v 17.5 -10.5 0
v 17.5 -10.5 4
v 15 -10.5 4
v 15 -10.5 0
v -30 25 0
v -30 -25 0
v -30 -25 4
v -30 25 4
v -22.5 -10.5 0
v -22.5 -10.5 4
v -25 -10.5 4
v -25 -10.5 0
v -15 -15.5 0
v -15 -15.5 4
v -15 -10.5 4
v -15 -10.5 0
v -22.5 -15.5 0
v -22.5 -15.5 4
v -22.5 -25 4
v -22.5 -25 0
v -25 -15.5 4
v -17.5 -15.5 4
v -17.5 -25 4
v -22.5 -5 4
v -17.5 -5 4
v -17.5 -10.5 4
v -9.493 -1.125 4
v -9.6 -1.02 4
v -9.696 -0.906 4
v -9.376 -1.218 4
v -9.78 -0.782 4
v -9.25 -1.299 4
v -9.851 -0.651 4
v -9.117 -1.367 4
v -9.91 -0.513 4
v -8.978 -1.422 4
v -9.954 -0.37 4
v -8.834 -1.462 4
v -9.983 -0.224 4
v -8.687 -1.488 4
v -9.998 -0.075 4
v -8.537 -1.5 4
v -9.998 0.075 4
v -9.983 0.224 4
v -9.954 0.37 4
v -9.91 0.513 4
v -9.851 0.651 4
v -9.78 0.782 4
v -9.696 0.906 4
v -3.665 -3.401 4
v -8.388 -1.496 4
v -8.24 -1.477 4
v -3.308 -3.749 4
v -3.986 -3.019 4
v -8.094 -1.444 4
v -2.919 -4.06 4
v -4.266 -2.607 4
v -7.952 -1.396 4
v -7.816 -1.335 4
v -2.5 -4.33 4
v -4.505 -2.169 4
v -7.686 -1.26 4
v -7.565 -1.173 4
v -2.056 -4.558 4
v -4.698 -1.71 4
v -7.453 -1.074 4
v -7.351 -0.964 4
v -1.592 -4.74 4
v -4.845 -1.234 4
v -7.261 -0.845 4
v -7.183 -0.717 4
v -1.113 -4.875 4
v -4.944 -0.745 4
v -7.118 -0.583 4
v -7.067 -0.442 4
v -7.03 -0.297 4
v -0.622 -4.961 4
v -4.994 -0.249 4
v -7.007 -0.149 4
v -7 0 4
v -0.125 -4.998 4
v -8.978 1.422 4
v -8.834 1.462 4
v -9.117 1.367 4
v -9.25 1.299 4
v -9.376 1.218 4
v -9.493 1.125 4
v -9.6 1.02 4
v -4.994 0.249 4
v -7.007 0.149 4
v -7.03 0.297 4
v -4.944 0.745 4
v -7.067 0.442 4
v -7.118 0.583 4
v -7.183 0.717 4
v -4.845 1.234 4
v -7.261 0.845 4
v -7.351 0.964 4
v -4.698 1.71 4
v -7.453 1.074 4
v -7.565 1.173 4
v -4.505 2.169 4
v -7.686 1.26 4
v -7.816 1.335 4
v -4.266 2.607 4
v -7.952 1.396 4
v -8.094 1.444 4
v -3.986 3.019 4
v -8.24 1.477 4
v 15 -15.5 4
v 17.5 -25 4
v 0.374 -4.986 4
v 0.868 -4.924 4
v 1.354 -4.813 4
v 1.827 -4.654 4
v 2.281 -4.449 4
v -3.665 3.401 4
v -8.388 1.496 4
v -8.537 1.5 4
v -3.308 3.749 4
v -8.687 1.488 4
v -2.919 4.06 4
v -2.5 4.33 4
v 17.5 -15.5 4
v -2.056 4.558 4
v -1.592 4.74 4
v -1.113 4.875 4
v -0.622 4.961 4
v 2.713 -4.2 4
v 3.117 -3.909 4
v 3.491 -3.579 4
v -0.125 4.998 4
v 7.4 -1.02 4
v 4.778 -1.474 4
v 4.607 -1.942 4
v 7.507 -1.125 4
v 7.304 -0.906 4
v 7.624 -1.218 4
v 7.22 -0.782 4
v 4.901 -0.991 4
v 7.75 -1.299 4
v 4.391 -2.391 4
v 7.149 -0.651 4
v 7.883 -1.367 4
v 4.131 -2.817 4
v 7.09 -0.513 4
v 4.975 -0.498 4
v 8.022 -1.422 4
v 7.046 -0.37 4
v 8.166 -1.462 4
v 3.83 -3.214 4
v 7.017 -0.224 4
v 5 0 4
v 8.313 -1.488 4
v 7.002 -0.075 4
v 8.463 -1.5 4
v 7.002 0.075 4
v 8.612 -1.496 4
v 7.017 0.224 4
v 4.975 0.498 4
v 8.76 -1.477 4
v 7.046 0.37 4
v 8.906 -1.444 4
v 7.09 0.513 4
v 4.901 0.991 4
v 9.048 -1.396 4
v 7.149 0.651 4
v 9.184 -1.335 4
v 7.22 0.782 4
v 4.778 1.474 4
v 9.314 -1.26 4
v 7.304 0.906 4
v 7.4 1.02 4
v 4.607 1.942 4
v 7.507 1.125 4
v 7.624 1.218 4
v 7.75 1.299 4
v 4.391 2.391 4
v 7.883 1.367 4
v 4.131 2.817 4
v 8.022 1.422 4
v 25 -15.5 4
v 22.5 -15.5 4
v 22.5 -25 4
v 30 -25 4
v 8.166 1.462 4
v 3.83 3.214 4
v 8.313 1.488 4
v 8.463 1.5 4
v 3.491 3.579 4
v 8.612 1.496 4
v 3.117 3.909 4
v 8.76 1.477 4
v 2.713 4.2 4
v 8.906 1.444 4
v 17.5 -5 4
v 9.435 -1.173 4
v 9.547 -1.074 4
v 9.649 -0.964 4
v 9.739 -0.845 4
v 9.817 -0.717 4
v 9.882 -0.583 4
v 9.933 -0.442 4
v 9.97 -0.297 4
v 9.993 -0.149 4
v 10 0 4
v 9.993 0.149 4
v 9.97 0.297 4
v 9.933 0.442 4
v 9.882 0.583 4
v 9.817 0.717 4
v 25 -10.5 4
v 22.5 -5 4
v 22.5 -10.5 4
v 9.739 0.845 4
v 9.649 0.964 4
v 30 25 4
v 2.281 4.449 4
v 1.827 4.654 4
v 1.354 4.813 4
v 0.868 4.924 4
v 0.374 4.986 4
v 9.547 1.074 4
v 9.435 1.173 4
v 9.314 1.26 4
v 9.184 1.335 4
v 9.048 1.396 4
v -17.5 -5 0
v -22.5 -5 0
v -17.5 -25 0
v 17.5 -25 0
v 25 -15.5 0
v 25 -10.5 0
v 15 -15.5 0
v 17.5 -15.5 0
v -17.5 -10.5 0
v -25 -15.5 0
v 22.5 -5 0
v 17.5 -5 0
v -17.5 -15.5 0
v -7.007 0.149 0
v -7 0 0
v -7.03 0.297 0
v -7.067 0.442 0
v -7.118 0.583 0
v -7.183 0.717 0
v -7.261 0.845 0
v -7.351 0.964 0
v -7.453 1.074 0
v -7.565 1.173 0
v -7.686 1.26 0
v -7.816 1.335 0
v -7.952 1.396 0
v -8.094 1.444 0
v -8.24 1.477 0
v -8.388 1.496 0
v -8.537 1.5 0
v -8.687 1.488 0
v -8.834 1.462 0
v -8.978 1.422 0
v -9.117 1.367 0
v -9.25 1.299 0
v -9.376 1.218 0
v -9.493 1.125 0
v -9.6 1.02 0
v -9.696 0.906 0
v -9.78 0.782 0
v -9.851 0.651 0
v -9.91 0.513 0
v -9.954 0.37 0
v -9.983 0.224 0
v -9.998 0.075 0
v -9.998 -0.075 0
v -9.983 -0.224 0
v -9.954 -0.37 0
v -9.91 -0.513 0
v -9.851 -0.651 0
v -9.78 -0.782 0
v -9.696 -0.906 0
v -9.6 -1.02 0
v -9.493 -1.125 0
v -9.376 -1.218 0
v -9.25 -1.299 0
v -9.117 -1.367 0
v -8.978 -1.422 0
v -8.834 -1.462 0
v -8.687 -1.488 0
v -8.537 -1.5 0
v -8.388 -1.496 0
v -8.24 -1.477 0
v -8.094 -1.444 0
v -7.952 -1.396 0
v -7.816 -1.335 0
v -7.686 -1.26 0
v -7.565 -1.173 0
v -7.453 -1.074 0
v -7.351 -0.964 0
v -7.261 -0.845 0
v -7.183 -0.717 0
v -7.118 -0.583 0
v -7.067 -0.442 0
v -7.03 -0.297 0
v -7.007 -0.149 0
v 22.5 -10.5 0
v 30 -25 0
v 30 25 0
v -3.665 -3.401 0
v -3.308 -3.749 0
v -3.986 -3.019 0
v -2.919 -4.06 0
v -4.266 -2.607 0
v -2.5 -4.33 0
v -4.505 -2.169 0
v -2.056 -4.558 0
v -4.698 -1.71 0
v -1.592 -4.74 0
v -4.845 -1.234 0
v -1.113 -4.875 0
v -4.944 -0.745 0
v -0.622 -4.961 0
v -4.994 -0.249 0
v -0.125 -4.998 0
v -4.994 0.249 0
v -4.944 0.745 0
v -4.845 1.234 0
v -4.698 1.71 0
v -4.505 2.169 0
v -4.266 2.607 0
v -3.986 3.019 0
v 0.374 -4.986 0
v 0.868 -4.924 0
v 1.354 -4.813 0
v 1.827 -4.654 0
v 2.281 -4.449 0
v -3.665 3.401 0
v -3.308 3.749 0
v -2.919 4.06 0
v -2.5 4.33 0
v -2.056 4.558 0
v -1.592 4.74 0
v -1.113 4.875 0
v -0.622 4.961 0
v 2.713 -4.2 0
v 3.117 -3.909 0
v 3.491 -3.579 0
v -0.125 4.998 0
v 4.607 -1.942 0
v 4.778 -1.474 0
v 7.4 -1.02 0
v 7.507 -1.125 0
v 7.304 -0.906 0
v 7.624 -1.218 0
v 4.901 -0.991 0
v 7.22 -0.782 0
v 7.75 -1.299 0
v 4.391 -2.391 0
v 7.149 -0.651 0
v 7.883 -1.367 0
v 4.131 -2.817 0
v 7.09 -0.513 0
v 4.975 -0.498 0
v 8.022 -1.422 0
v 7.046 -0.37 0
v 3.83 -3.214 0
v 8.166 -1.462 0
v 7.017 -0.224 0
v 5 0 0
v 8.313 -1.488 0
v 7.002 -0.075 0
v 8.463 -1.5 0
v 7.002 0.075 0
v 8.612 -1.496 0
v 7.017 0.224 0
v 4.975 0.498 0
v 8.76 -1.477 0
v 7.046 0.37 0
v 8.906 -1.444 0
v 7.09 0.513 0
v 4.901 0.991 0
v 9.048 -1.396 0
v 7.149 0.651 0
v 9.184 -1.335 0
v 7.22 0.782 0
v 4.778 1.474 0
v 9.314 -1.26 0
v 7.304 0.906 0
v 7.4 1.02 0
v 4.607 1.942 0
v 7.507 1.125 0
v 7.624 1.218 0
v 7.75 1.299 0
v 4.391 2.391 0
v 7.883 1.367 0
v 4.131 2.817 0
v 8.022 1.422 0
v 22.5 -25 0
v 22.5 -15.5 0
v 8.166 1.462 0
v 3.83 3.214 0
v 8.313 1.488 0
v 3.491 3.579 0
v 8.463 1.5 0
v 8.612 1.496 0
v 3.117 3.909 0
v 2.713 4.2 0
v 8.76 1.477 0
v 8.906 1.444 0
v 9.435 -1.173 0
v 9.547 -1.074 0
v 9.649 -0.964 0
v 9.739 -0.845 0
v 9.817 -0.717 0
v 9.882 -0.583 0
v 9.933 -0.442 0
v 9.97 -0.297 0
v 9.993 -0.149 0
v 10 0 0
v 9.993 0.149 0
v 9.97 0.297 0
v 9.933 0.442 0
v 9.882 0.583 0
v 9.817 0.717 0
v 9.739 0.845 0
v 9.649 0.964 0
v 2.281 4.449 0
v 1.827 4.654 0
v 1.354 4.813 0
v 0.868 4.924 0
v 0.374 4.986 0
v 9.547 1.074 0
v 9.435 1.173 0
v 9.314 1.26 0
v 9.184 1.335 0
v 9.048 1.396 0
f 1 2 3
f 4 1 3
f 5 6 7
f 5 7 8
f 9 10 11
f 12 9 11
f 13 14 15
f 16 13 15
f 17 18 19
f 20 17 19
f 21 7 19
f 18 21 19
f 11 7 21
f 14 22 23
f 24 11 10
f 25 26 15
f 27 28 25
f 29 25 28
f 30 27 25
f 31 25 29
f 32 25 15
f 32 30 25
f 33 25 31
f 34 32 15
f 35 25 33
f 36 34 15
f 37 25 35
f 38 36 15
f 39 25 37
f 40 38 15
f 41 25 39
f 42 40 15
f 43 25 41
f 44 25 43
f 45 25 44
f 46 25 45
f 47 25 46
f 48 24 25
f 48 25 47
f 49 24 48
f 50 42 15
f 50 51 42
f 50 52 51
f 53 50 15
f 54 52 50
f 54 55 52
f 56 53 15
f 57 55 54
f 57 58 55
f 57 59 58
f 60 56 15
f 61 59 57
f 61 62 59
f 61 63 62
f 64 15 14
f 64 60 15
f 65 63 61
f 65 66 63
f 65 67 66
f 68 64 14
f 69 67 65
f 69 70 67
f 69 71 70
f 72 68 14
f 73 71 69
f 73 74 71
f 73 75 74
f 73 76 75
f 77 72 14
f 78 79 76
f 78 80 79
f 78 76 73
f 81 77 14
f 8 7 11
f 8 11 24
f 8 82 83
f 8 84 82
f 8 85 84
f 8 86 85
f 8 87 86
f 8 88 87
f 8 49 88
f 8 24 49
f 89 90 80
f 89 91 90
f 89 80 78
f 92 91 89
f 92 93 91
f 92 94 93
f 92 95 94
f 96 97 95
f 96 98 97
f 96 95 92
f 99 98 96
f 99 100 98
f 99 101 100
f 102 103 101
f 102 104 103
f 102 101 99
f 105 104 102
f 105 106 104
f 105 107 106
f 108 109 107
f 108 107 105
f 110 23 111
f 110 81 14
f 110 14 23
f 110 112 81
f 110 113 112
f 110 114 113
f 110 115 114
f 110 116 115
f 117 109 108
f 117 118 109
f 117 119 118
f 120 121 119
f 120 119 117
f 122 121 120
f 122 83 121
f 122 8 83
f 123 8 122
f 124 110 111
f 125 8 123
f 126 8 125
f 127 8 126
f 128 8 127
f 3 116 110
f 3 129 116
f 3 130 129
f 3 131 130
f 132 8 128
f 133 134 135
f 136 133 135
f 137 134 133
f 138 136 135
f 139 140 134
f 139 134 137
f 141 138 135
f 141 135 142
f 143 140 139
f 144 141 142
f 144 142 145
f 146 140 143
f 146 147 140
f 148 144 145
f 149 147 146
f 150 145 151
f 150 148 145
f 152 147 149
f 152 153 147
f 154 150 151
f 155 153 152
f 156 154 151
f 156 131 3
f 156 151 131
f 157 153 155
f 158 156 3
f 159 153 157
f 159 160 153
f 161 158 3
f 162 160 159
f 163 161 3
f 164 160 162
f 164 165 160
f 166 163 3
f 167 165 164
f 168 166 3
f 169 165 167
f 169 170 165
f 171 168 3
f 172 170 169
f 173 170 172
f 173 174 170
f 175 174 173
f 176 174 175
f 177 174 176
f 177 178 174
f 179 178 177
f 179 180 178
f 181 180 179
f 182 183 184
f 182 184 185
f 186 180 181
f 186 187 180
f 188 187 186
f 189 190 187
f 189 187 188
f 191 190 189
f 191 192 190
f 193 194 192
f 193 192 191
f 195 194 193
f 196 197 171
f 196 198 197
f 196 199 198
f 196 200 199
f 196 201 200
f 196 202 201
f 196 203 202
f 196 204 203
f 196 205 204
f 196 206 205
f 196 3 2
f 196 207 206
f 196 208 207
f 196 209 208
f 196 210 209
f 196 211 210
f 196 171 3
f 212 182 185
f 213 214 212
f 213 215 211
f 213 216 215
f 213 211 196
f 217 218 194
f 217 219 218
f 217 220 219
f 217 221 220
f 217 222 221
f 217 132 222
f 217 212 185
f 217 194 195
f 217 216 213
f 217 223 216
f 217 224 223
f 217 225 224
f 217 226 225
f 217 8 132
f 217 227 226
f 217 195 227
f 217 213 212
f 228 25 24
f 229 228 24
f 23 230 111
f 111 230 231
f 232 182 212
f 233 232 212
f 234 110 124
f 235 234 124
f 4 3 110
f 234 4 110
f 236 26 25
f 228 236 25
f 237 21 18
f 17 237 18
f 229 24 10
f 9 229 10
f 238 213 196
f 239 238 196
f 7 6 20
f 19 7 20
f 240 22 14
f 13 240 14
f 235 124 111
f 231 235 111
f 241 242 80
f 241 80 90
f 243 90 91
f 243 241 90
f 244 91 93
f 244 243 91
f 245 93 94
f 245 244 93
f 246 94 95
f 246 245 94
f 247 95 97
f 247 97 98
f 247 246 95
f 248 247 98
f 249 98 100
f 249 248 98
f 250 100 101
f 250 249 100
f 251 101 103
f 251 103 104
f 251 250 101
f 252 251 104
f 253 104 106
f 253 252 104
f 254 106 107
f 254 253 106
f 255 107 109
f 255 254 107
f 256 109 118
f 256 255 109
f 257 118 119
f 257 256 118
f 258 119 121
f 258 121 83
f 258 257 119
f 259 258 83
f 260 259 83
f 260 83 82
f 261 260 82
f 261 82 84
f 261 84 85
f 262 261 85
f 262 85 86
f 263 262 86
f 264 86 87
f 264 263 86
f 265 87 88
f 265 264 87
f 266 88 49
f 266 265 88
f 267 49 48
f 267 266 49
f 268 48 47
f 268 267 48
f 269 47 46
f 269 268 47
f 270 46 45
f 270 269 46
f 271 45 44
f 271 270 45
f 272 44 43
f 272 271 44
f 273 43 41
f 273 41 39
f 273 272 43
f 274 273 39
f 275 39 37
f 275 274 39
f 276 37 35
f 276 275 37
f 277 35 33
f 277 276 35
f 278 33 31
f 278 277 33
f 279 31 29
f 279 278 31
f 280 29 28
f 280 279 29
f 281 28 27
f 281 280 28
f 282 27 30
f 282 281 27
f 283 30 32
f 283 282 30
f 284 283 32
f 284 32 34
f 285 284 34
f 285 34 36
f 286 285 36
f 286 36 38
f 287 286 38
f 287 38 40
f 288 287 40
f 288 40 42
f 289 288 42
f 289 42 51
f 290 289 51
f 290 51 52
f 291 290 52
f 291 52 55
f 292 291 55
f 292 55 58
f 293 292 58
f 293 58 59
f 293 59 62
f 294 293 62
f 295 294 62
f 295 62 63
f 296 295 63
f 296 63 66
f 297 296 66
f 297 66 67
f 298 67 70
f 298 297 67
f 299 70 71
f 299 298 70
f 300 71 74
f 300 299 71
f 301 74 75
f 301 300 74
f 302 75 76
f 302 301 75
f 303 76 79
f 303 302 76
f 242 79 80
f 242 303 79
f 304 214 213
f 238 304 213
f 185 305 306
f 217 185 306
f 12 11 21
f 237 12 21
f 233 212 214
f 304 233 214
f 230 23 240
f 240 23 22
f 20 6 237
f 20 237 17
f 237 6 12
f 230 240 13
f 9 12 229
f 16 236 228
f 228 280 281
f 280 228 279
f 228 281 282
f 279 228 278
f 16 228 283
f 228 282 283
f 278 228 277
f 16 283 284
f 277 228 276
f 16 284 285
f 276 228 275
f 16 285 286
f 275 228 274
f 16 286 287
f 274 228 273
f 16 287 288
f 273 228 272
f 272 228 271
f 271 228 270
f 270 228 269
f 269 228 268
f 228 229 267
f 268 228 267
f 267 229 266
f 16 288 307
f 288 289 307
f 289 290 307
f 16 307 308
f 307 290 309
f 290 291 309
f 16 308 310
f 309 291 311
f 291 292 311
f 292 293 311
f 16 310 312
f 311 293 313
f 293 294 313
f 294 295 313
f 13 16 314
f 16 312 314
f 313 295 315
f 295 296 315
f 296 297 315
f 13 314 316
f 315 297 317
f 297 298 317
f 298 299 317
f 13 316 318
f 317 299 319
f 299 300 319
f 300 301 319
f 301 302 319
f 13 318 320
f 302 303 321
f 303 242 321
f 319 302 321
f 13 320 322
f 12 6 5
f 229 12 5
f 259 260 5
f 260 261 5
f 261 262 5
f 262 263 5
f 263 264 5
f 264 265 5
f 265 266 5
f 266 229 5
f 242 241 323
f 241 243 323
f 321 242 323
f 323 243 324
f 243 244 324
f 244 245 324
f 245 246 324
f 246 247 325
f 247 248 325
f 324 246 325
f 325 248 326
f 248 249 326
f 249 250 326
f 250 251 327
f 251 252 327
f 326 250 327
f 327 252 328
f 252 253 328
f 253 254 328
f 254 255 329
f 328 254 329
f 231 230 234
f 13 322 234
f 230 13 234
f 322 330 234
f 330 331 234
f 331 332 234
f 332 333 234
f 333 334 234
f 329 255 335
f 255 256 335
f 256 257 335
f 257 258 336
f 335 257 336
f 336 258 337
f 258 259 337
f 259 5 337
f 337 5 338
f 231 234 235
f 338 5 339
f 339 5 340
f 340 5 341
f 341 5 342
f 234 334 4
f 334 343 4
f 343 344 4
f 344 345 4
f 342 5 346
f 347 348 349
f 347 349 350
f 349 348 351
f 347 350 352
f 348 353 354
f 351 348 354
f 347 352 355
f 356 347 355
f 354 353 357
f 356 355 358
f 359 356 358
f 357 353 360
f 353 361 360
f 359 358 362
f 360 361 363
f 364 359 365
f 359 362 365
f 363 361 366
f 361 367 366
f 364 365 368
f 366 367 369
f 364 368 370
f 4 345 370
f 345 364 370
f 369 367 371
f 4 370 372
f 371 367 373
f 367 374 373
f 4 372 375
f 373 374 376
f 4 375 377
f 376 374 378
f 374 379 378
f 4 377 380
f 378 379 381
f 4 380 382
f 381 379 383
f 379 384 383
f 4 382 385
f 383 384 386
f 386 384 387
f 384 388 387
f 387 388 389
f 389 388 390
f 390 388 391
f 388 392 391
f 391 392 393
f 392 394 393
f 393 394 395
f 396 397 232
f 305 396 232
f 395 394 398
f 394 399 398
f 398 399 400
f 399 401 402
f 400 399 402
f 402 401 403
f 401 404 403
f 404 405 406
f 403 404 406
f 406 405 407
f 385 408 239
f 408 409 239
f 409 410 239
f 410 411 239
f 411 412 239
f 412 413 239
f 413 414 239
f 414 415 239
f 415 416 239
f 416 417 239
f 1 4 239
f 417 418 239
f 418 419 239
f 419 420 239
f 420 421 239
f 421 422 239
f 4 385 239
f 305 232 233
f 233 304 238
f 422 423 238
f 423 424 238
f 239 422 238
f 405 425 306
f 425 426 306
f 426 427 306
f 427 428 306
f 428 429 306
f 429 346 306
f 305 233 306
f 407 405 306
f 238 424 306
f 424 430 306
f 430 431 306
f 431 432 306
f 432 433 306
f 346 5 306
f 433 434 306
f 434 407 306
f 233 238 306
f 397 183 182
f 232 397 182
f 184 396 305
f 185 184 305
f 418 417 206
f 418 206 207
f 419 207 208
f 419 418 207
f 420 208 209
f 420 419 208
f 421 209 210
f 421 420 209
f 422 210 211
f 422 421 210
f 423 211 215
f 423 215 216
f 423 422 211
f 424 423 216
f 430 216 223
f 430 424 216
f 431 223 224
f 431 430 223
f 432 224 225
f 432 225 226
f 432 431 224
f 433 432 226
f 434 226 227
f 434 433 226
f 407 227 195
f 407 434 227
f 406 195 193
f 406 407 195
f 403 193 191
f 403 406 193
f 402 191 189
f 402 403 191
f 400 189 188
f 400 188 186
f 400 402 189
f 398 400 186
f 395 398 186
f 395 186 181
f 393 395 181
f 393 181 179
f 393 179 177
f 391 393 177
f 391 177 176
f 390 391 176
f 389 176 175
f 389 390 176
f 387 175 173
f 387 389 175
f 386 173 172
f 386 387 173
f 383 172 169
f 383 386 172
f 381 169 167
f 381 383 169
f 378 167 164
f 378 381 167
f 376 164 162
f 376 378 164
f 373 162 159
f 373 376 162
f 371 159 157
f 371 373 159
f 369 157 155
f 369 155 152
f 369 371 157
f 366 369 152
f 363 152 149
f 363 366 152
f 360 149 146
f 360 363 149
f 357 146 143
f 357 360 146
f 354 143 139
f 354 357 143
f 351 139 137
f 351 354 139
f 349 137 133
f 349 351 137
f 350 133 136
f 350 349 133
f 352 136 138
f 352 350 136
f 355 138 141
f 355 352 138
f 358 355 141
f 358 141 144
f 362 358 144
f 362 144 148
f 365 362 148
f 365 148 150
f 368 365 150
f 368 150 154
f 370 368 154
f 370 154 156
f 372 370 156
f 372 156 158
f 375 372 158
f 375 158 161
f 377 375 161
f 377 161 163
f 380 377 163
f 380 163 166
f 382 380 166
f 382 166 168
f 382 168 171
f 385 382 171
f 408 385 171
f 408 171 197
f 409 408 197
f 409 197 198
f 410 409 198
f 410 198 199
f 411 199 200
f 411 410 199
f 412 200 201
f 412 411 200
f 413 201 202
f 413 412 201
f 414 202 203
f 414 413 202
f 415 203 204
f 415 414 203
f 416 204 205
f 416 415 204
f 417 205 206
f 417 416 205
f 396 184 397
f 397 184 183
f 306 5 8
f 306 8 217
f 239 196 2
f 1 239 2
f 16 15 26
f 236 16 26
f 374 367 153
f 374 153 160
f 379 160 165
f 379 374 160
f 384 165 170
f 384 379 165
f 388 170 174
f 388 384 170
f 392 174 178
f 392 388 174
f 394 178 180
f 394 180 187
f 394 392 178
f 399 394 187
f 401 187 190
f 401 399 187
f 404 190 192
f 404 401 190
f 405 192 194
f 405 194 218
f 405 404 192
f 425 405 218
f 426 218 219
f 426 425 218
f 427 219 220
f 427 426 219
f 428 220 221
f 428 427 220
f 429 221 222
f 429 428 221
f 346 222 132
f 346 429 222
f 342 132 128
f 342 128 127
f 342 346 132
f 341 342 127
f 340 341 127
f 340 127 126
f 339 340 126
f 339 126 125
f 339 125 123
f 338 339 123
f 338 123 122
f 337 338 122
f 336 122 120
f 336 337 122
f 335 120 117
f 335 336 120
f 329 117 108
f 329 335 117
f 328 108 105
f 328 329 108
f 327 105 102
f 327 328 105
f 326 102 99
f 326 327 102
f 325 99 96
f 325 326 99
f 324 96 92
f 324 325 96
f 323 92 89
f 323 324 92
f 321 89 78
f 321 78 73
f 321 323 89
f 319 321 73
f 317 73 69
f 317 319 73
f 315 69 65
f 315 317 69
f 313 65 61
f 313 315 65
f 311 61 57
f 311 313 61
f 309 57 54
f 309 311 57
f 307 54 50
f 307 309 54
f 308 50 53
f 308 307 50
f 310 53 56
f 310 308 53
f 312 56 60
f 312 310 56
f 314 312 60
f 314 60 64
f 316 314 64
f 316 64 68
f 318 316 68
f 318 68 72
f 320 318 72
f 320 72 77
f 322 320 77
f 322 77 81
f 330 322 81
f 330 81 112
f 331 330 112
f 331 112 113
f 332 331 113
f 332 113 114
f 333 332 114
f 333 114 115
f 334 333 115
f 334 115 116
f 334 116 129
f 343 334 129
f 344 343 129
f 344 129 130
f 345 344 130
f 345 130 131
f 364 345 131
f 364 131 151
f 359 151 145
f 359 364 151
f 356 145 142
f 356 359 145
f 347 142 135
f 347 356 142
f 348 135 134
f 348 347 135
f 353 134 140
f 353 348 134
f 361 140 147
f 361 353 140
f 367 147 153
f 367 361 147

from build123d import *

# Parameters (mm, degrees)
SKETCH1_W           = 60
SKETCH1_H           = 50
SKETCH1_R           = 5
SKETCH1_R_2         = 1.5
BOSS_EXTRUDE1_DEPTH = 4
CUT_EXTRUDE1_DEPTH  = 5


with BuildPart() as part:
    # Sketch1 → Boss-Extrude1 (new body)
    with BuildSketch(Plane.XY):
        Rectangle(SKETCH1_W, SKETCH1_H)
        Circle(SKETCH1_R, mode=Mode.SUBTRACT)
        with Locations((-8.5, 0)):
            Circle(SKETCH1_R_2, mode=Mode.SUBTRACT)
        with Locations((8.5, 0)):
            Circle(SKETCH1_R_2, mode=Mode.SUBTRACT)
    extrude(amount=BOSS_EXTRUDE1_DEPTH)

    # Sketch2 → Cut-Extrude1 (cut, through all)
    with BuildSketch(Plane.XY.offset(4)):
        Polygon((-17.5, -5), (-22.5, -5), (-22.5, -10.5), (-25, -10.5), (-25, -15.5), (-22.5, -15.5), (-22.5, -25), (-17.5, -25), (-17.5, -15.5), (-15, -15.5), (-15, -10.5), (-17.5, -10.5), align=None)
        Polygon((22.5, -5), (17.5, -5), (17.5, -10.5), (15, -10.5), (15, -15.5), (17.5, -15.5), (17.5, -25), (22.5, -25), (22.5, -15.5), (25, -15.5), (25, -10.5), (22.5, -10.5), align=None)
    extrude(amount=-CUT_EXTRUDE1_DEPTH, mode=Mode.SUBTRACT)


solid = part.part
